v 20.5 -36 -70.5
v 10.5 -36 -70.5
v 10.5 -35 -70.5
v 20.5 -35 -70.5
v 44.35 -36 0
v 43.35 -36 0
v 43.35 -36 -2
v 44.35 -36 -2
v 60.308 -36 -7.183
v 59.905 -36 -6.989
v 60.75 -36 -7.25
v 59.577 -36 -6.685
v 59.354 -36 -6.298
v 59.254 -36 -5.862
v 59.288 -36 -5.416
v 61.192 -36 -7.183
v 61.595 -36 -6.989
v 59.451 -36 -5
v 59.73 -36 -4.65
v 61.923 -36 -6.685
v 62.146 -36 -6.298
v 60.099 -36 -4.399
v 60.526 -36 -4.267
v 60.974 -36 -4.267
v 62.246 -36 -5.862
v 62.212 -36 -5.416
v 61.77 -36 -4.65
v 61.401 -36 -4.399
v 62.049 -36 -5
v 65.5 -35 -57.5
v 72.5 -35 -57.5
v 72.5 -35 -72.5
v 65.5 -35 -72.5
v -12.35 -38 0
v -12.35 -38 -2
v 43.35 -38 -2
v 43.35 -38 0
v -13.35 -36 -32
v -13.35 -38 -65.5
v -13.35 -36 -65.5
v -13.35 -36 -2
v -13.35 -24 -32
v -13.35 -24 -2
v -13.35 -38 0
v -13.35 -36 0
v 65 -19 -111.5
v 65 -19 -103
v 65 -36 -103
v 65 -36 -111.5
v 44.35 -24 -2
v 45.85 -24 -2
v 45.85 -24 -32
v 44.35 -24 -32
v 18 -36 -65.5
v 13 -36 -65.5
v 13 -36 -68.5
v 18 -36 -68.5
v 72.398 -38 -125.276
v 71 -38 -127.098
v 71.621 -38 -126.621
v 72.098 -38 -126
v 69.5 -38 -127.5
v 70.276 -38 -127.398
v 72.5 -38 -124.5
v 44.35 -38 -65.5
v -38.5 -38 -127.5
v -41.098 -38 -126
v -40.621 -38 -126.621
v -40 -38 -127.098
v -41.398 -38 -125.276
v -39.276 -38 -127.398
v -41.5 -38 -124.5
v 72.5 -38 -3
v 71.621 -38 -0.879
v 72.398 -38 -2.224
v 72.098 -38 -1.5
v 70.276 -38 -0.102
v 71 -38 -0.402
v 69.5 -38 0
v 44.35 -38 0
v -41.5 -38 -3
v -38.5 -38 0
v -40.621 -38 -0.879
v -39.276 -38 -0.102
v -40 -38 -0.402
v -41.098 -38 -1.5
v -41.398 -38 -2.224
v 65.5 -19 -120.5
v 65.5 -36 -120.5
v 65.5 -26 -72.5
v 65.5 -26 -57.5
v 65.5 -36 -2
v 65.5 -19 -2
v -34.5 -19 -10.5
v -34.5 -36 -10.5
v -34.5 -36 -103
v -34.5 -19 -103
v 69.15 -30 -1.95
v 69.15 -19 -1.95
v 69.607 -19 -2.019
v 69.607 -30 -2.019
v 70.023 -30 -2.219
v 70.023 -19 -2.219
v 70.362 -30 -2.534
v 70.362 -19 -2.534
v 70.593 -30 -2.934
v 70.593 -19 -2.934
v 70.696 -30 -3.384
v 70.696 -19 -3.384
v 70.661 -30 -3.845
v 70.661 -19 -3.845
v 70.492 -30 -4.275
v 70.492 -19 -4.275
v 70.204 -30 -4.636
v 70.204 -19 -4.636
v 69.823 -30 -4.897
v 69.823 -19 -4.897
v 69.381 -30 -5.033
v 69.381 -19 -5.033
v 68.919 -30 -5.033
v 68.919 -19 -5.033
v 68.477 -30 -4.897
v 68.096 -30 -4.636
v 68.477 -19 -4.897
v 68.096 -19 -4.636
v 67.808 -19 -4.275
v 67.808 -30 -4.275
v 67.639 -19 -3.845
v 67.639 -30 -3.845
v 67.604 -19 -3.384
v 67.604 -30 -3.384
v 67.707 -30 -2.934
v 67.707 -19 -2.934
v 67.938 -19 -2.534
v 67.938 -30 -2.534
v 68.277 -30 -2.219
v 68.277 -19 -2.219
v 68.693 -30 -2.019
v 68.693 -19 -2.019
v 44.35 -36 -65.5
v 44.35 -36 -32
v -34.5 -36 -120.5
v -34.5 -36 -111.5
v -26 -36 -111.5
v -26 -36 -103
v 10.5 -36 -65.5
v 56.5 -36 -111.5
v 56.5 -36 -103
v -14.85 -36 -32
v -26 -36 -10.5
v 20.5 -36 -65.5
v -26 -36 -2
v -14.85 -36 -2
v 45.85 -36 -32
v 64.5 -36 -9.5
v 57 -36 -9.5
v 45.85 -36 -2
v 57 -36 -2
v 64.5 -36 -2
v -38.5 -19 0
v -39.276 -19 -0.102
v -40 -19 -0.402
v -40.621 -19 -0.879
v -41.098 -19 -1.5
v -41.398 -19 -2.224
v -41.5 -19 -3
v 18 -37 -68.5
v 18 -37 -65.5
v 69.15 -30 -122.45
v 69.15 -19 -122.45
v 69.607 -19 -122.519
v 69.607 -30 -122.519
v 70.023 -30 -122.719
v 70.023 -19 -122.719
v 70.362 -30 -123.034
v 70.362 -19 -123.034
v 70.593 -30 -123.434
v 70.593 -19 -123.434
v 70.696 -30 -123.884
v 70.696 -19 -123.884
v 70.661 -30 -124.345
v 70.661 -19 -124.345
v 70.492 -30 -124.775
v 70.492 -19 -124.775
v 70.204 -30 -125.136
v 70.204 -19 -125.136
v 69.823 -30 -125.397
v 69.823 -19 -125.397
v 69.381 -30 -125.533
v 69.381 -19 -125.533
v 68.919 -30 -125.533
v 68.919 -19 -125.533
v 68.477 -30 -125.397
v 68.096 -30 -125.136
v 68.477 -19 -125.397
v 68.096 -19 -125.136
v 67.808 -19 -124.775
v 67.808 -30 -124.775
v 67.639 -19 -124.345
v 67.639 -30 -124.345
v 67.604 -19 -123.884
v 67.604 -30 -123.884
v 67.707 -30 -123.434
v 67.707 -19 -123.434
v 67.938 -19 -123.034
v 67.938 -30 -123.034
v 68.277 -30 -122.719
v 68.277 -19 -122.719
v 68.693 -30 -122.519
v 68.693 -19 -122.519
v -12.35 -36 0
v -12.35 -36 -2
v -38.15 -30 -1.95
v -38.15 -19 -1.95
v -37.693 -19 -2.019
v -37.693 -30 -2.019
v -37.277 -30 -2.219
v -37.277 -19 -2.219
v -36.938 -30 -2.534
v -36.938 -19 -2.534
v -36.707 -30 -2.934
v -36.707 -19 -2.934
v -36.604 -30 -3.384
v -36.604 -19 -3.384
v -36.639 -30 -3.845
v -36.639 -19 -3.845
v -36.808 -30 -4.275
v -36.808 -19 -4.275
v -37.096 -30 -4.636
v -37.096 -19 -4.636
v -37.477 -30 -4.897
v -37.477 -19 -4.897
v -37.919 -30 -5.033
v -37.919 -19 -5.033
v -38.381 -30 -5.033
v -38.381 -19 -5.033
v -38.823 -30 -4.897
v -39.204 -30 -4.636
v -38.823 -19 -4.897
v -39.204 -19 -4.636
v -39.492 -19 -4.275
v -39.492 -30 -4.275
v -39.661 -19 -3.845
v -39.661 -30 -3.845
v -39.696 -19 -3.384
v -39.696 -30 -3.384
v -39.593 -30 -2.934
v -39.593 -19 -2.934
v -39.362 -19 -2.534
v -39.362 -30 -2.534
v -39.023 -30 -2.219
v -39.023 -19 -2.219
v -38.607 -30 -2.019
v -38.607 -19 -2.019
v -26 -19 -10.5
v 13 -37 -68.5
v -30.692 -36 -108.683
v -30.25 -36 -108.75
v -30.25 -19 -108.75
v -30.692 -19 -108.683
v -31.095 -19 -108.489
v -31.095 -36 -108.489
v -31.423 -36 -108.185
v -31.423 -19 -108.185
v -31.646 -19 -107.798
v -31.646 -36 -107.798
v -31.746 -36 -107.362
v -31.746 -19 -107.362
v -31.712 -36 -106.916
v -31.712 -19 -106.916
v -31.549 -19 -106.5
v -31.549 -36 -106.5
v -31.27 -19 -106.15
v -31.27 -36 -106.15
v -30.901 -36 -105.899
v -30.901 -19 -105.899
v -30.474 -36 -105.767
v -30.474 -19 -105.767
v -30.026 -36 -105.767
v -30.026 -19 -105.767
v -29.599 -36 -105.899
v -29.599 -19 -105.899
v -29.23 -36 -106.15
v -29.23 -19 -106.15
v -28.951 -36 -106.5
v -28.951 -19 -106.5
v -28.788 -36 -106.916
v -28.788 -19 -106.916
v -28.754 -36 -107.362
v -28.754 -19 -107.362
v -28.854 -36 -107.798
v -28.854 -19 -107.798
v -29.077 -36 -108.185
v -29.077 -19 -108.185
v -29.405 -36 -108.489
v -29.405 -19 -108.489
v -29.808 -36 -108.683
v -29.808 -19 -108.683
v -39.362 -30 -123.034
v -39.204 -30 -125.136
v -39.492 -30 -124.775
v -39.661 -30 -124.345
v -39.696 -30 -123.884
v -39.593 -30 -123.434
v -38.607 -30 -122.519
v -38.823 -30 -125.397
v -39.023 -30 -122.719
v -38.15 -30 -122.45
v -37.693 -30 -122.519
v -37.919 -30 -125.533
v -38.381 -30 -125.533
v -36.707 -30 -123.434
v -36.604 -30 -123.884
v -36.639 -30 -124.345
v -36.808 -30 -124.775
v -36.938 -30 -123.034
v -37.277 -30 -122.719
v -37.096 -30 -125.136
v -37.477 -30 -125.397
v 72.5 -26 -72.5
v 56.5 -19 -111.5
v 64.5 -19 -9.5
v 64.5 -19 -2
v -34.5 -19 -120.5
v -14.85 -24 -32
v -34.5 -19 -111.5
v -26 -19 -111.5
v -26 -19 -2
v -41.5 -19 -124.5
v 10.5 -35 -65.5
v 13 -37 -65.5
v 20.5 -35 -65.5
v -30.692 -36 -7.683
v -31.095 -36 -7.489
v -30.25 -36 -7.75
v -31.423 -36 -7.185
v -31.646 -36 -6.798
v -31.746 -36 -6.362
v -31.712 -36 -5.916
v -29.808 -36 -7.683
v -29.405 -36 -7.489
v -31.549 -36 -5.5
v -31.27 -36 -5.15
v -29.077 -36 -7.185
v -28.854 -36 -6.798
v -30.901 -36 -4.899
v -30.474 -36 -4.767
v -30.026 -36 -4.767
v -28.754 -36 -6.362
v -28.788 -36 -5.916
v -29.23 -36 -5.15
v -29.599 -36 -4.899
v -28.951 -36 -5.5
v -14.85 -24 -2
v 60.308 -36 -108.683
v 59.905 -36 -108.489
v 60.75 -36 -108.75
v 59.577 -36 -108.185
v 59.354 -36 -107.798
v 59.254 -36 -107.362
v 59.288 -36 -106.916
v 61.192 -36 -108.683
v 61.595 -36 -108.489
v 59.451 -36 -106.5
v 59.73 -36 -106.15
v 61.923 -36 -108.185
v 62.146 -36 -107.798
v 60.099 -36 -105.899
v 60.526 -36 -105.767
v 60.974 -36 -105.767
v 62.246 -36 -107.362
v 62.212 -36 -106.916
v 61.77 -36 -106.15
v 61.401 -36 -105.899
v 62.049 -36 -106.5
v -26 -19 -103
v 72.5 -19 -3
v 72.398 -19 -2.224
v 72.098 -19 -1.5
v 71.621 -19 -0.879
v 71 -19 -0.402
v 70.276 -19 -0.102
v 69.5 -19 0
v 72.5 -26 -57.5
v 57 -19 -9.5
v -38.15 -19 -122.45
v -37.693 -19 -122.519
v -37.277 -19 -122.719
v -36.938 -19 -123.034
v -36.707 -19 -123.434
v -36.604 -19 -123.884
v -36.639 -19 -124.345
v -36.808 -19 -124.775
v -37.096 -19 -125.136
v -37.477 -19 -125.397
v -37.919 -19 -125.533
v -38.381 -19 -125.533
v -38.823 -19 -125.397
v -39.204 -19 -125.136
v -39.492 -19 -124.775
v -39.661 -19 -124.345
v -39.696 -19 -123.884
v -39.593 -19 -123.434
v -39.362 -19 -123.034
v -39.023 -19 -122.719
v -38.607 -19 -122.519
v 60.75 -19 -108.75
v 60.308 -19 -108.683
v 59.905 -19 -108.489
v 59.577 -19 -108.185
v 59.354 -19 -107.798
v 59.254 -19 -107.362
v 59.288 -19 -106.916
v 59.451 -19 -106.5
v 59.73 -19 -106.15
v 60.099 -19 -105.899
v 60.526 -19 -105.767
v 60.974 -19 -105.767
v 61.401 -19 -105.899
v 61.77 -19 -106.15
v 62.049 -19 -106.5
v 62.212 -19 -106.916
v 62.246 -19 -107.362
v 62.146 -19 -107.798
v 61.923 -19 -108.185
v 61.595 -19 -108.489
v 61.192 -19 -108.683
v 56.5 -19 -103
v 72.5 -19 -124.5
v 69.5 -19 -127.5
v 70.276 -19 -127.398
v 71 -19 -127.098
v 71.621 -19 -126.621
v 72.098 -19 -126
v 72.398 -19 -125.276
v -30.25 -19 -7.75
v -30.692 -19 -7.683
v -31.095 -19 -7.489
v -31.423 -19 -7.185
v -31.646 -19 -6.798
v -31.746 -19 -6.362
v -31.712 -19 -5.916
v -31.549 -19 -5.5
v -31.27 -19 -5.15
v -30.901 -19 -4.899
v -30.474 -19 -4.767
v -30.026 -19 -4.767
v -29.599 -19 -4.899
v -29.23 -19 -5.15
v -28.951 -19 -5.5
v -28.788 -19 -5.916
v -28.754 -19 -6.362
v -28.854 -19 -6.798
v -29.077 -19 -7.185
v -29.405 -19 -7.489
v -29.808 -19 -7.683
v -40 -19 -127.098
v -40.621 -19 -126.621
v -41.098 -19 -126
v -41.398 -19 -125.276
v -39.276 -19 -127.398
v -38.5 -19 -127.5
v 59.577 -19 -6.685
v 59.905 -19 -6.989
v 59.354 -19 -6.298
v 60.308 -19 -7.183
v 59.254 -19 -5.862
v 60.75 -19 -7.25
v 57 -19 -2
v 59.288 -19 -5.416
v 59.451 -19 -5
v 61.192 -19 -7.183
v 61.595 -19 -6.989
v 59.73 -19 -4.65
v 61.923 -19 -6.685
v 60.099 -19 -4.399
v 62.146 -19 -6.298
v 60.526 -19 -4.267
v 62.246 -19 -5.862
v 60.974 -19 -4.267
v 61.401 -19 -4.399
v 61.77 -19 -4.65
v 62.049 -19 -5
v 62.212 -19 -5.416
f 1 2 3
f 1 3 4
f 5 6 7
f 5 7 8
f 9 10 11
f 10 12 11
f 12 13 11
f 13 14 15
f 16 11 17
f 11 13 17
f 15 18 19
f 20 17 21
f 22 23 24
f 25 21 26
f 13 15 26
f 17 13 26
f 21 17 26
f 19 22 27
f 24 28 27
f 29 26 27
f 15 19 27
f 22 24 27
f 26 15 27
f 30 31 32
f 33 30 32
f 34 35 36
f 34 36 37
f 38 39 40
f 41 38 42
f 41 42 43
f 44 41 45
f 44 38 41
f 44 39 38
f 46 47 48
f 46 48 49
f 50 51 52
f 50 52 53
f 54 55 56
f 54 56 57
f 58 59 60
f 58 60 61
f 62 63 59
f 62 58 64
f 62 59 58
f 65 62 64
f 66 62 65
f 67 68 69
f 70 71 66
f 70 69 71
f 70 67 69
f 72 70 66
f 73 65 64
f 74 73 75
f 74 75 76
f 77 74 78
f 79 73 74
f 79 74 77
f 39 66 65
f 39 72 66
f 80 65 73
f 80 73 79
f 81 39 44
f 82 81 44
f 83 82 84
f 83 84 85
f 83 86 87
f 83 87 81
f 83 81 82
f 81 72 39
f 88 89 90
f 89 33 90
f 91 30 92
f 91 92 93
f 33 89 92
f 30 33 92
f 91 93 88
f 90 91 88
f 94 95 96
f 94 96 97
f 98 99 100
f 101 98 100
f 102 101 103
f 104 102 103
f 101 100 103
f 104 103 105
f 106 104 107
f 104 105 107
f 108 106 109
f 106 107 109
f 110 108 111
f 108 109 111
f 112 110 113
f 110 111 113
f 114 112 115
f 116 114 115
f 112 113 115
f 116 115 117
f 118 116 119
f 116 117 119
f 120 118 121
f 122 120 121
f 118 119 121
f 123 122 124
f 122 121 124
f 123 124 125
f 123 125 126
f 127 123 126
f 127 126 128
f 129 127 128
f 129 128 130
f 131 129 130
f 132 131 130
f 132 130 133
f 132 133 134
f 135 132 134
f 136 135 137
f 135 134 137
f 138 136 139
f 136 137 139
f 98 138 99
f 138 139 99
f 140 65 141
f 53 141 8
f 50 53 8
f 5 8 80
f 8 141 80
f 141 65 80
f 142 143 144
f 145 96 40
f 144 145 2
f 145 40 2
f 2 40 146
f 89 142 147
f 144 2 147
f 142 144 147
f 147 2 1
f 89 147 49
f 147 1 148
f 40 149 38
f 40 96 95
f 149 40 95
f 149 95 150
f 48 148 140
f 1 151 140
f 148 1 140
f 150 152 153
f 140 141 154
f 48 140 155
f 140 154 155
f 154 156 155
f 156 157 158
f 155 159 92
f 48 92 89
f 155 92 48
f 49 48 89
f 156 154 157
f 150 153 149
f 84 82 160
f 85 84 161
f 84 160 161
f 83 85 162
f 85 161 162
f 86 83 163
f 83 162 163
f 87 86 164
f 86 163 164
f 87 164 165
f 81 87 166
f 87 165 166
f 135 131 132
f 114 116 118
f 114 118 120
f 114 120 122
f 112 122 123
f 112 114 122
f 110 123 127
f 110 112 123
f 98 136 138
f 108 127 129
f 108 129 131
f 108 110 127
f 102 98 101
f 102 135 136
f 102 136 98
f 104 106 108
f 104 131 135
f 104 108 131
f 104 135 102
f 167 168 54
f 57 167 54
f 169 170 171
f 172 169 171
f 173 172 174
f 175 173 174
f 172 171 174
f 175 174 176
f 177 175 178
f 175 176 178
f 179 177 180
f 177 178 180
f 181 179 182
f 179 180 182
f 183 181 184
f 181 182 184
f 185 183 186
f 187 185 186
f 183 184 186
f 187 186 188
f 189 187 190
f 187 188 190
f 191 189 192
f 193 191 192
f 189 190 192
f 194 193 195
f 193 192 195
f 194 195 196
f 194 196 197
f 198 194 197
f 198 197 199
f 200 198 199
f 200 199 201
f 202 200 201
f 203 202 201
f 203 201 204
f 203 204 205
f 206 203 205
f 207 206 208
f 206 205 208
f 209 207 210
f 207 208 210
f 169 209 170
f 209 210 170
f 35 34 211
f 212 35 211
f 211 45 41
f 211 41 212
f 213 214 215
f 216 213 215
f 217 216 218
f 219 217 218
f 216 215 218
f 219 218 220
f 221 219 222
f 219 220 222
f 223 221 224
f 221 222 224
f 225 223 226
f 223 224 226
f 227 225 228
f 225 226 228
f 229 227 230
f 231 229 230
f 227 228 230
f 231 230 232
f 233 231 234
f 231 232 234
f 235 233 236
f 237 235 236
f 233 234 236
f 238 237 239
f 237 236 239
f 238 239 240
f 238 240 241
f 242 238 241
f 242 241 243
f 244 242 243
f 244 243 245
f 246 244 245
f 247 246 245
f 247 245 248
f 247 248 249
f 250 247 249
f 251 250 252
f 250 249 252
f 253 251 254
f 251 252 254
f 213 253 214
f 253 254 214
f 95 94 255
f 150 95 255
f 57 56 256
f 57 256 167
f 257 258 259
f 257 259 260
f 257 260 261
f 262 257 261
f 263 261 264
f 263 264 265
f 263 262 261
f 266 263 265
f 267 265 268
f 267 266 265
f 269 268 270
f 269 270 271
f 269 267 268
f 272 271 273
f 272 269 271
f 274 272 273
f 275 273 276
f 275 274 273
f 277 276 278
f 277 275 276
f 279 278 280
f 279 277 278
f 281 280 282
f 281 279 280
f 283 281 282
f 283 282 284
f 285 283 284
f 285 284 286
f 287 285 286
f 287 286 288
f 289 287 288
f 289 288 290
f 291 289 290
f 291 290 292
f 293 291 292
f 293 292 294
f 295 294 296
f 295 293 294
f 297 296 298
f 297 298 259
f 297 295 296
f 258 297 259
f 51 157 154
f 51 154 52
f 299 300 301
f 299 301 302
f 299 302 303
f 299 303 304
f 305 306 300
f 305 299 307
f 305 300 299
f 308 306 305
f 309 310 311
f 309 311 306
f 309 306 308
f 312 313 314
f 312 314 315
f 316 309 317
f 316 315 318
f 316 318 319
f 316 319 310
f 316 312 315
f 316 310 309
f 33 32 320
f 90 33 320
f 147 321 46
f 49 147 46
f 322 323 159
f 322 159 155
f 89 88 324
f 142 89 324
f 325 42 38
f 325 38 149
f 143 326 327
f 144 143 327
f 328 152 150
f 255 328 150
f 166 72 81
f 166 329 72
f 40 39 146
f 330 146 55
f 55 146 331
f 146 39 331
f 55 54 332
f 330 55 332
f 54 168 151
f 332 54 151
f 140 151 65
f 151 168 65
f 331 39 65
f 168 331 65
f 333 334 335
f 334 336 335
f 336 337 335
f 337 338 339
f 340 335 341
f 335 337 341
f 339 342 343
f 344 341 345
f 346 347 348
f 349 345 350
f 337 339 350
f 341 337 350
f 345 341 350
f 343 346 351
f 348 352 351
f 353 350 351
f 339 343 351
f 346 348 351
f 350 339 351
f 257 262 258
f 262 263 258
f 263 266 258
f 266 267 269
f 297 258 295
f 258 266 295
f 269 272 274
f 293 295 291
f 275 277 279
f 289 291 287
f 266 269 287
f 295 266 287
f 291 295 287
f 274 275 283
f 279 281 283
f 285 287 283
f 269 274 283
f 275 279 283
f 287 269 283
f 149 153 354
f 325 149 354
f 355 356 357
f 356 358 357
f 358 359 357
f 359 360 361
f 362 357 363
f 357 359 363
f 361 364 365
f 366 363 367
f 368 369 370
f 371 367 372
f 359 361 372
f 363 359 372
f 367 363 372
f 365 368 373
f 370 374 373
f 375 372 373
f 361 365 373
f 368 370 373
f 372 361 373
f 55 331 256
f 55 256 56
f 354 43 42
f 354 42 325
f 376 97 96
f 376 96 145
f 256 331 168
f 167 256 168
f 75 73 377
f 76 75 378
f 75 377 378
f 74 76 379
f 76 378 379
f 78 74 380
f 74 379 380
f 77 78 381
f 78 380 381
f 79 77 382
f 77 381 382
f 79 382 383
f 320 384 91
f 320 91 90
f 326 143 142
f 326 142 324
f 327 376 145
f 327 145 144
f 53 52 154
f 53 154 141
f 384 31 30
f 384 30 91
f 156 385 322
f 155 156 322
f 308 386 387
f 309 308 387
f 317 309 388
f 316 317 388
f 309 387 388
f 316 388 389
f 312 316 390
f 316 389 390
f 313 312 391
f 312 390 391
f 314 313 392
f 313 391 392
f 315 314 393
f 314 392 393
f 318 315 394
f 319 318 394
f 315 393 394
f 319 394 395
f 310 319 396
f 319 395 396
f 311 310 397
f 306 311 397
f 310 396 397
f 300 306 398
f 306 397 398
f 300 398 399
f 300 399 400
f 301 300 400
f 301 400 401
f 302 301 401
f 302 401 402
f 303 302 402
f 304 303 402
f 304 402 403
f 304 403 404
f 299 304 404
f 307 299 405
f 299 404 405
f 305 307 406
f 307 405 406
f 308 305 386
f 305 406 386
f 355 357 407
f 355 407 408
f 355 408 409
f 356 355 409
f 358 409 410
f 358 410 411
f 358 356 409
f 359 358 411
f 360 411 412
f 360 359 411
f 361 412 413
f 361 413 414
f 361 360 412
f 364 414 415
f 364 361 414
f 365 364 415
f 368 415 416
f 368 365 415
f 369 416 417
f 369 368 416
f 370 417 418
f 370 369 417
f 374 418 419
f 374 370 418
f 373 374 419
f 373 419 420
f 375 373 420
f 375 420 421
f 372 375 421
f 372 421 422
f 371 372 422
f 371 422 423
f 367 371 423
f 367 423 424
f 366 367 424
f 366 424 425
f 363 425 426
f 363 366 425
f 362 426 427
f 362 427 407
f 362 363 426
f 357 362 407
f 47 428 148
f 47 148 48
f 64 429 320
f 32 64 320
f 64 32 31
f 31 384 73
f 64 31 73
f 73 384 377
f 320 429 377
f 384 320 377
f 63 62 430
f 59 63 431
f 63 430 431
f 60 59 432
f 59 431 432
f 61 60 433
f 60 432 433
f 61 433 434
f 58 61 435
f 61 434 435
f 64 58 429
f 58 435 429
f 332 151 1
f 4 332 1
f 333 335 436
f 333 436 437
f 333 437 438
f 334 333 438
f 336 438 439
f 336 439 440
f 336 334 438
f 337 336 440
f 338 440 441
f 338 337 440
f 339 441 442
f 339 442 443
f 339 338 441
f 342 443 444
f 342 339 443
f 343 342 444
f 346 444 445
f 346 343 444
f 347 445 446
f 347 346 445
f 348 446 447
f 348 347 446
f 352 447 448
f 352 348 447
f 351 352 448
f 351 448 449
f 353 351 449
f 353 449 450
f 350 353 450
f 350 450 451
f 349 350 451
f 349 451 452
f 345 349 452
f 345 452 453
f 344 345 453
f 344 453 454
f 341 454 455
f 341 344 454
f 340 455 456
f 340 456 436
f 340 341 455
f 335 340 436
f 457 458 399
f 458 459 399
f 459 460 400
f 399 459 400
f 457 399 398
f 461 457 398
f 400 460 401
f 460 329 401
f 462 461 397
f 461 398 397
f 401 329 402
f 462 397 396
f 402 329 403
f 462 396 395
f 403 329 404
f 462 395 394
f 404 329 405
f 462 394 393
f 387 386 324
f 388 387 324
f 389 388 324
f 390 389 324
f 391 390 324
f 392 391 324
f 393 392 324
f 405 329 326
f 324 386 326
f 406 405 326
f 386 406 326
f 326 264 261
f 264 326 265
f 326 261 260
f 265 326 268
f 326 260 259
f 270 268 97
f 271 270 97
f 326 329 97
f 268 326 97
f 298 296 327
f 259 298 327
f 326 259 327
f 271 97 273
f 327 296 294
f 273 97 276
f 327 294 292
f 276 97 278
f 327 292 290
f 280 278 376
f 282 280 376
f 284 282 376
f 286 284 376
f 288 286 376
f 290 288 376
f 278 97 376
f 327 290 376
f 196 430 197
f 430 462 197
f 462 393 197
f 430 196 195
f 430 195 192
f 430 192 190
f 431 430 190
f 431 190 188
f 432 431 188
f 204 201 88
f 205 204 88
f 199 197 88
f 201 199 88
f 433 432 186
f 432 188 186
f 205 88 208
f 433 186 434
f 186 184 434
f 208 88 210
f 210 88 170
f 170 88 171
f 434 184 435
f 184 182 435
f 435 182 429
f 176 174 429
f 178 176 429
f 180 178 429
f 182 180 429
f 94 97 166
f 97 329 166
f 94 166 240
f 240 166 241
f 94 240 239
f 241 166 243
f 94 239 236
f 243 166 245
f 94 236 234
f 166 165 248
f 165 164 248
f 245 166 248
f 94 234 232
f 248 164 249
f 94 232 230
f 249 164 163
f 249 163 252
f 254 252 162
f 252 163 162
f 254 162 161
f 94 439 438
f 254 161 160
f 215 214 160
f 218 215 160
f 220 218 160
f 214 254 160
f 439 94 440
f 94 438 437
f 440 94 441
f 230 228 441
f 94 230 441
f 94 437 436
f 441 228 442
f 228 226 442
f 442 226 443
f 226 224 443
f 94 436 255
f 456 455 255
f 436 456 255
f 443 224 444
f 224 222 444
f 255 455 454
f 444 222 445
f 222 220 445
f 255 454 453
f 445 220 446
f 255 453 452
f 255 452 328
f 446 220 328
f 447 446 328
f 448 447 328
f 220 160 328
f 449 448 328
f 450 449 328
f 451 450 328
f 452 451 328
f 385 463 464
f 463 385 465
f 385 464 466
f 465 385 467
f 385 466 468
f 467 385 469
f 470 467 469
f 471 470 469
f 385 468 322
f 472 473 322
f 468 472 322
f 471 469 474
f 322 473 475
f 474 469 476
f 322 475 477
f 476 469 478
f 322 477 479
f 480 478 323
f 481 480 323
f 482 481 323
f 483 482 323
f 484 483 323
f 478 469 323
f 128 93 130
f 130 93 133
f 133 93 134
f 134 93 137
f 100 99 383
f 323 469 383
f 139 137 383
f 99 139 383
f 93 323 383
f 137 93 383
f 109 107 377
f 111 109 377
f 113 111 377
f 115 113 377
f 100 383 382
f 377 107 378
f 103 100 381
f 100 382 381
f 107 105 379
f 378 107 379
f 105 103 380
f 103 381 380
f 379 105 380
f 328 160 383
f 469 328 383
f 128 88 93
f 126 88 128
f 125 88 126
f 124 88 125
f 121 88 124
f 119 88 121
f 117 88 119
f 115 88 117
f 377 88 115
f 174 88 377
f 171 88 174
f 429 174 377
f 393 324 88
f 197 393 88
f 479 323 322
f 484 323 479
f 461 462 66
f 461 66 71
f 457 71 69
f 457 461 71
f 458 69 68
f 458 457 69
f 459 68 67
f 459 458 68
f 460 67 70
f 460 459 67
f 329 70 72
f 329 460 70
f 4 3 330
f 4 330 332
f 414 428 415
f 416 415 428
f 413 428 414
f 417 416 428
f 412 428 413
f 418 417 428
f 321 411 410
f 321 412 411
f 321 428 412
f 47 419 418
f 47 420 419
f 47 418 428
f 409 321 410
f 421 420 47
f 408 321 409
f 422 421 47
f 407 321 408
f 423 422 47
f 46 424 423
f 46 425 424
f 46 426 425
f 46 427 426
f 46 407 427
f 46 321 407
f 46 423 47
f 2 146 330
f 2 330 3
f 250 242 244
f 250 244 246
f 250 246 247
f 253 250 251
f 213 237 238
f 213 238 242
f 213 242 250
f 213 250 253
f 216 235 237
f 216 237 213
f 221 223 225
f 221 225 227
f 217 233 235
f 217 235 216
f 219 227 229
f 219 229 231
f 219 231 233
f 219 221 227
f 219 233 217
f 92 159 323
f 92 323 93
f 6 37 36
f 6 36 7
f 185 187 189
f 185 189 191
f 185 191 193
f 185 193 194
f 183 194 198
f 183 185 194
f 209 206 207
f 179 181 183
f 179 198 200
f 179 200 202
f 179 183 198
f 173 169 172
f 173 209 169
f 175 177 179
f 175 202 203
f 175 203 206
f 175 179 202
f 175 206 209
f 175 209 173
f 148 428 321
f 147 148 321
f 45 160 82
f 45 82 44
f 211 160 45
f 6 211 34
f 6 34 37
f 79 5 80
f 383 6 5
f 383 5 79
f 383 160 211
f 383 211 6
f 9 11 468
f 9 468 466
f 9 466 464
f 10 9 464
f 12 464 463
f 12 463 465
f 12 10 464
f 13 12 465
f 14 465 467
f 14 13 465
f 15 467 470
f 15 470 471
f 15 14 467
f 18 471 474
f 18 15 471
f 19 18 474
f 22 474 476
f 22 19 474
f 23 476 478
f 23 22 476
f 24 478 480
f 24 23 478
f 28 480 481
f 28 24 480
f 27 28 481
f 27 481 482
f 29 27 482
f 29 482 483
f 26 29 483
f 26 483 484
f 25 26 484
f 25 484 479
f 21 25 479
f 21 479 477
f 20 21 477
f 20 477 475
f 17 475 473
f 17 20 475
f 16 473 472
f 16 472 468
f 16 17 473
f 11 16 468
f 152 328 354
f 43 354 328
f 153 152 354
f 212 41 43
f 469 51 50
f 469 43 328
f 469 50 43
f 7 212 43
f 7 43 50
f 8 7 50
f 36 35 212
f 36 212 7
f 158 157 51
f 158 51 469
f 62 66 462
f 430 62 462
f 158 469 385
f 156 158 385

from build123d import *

# Parameters (mm, degrees)
SALIENTE_EXTRUIR4_DEPTH  = 2
SALIENTE_EXTRUIR6_DEPTH  = 120.5
CROQUIS8_W               = 104
CROQUIS8_H               = 122.5
SALIENTE_EXTRUIR7_DEPTH  = 2
CROQUIS9_W               = 100
CROQUIS9_H               = 17
SALIENTE_EXTRUIR8_DEPTH  = 2
CROQUIS13_W              = 8.5
CROQUIS13_H              = 8.5
CROQUIS13_R              = 1.5
CROQUIS13_W_2            = 7.5
CROQUIS13_H_2            = 7.5
SALIENTE_EXTRUIR9_DEPTH  = 17
CROQUIS14_W              = 5
CROQUIS14_H              = 28
SALIENTE_EXTRUIR10_DEPTH = 122.5
CROQUIS15_W              = 5
CROQUIS15_H              = 28
SALIENTE_EXTRUIR11_DEPTH = 114
REDONDEO1_R              = 3
CORTAR_EXTRUIR1_REACH    = 153.514
CROQUIS17_W              = 5
CROQUIS17_H              = 9
CORTAR_EXTRUIR2_REACH    = 173.992
CROQUIS18_W              = 5
CROQUIS18_H              = 9
CROQUIS19_R              = 1.55
CORTAR_EXTRUIR3_DEPTH    = 11
CROQUIS20_W              = 57.7
CROQUIS20_H              = 63.5
CORTAR_EXTRUIR4_DEPTH    = 152.514025753
CROQUIS22_W              = 1.5
CROQUIS22_H              = 12
SALIENTE_EXTRUIR12_DEPTH = 30
CROQUIS26_W              = 10
CROQUIS26_H              = 5
SALIENTE_EXTRUIR14_DEPTH = 1
CROQUIS27_W              = 5
CROQUIS27_H              = 1
CORTAR_EXTRUIR8_DEPTH    = 3
CROQUIS28_W              = 1
CROQUIS28_H              = 2
CORTAR_EXTRUIR9_DEPTH    = 10
CROQUIS29_W              = 102
CROQUIS29_H              = 7.5
CORTAR_EXTRUIR11_DEPTH   = 125.5
CROQUIS30_W              = 102
CROQUIS30_H              = 19
CORTAR_EXTRUIR12_DEPTH   = 152.514025753
CROQUIS31_W              = 15
CROQUIS31_H              = 9
CORTAR_EXTRUIR13_DEPTH   = 10


with BuildPart() as part:
    # Croquis5 → Saliente-Extruir4 (new body)
    with BuildSketch(Plane.XY):
        Polygon((0, 0), (39, 0), (39, -10), (66.5, -10), (66.5, -19), (67.5, -19), (67.5, -36), (-36.5, -36), (-36.5, -19), (-35.5, -19), (-35.5, -10), (0, -10), align=None)
    extrude(amount=-SALIENTE_EXTRUIR4_DEPTH)

    # Croquis7 → Saliente-Extruir6 (add)
    with BuildSketch(Plane(origin=(0, 0, -2), x_dir=(-1, 0, 0), z_dir=(0, 0, -1))):
        Polygon((-67.5, -36), (-65.5, -36), (-65.5, -11.5), (-66.5, -11.5), (-66.5, -19), (-67.5, -19), align=None)
        Polygon((36.5, -36), (34.5, -36), (34.5, -11.5), (35.5, -11.5), (35.5, -19), (36.5, -19), align=None)
    extrude(amount=SALIENTE_EXTRUIR6_DEPTH)

    # Croquis8 → Saliente-Extruir7 (add)
    with BuildSketch(Plane.XZ.offset(36)):
        with Locations((15.5, -61.25)):
            Rectangle(CROQUIS8_W, CROQUIS8_H)
    extrude(amount=SALIENTE_EXTRUIR7_DEPTH)

    # Croquis9 → Saliente-Extruir8 (add)
    with BuildSketch(Plane(origin=(0, 0, -122.5), x_dir=(-1, 0, 0), z_dir=(0, 0, -1))):
        with Locations((-15.5, -27.5)):
            Rectangle(CROQUIS9_W, CROQUIS9_H)
    extrude(amount=-SALIENTE_EXTRUIR8_DEPTH)

    # Croquis13 → Saliente-Extruir9 (add)
    # profile 1 of 4: a face of its own
    with BuildSketch(Plane(origin=(0, -36, 0), x_dir=(1, 0, 0), z_dir=(0, 1, 0))):
        with Locations((-30.25, 6.25)):
            Rectangle(CROQUIS13_W, CROQUIS13_H)
        with Locations(Location((-30.25, 6.25, 0), (0, 0, 90))):
            Circle(CROQUIS13_R, mode=Mode.SUBTRACT)
    # profile 2 of 4: a face of its own
    with BuildSketch(Plane(origin=(0, -36, 0), x_dir=(1, 0, 0), z_dir=(0, 1, 0))):
        with Locations((-30.25, 107.25)):
            Rectangle(CROQUIS13_W, CROQUIS13_H)
        with Locations(Location((-30.25, 107.25, 0), (0, 0, 90))):
            Circle(CROQUIS13_R, mode=Mode.SUBTRACT)
    # profile 3 of 4: a face of its own
    with BuildSketch(Plane(origin=(0, -36, 0), x_dir=(1, 0, 0), z_dir=(0, 1, 0))):
        with Locations((60.75, 107.25)):
            Rectangle(CROQUIS13_W, CROQUIS13_H)
        with Locations(Location((60.75, 107.25, 0), (0, 0, 90))):
            Circle(CROQUIS13_R, mode=Mode.SUBTRACT)
    # profile 4 of 4: a face of its own
    with BuildSketch(Plane(origin=(0, -36, 0), x_dir=(1, 0, 0), z_dir=(0, 1, 0))):
        with Locations((60.75, 5.75)):
            Rectangle(CROQUIS13_W_2, CROQUIS13_H_2)
        with Locations(Location((60.75, 5.75, 0), (0, 0, 90))):
            Circle(CROQUIS13_R, mode=Mode.SUBTRACT)
    extrude(amount=SALIENTE_EXTRUIR9_DEPTH)

    # Croquis14 → Saliente-Extruir10 (add)
    with BuildSketch(Plane.XY):
        with Locations((-39, -24)):
            Rectangle(CROQUIS14_W, CROQUIS14_H)
        with Locations((70, -24)):
            Rectangle(CROQUIS14_W, CROQUIS14_H)
    extrude(amount=-SALIENTE_EXTRUIR10_DEPTH)

    # Croquis15 → Saliente-Extruir11 (add)
    with BuildSketch(Plane.ZY.offset(41.5)):
        with Locations((-125, -24)):
            Rectangle(CROQUIS15_W, CROQUIS15_H)
    extrude(amount=-SALIENTE_EXTRUIR11_DEPTH)

    # Redondeo1
    redondeo1_edges = [part.edges().sort_by_distance(p)[0] for p in [
        (-41.5, -24, 0),
        (72.5, -24, 0),
        (-41.5, -24, -127.5),
        (72.5, -24, -127.5),
    ]]
    fillet(redondeo1_edges, radius=REDONDEO1_R)

    # Croquis17 → Cortar-Extruir1 (cut, up to next)
    with BuildSketch(Plane.XY, mode=Mode.PRIVATE) as cortar_extruir1_sk1:
        with Locations((-39, -14.5)):
            Rectangle(CROQUIS17_W, CROQUIS17_H)
    cortar_extruir1_tool1 = extrude(cortar_extruir1_sk1.sketch, amount=-CORTAR_EXTRUIR1_REACH, mode=Mode.PRIVATE) & part.part
    # Croquis17 → Cortar-Extruir1 (cut, up to next)
    with BuildSketch(Plane.XY, mode=Mode.PRIVATE) as cortar_extruir1_sk2:
        with Locations((70, -14.5)):
            Rectangle(CROQUIS17_W, CROQUIS17_H)
    cortar_extruir1_tool2 = extrude(cortar_extruir1_sk2.sketch, amount=-CORTAR_EXTRUIR1_REACH, mode=Mode.PRIVATE) & part.part
    add(cortar_extruir1_tool1.solids().sort_by_distance((-39, -14.5, 0))[0], mode=Mode.SUBTRACT)
    add(cortar_extruir1_tool2.solids().sort_by_distance((70, -14.5, 0))[0], mode=Mode.SUBTRACT)

    # Croquis18 → Cortar-Extruir2 (cut, up to next)
    with BuildSketch(Plane(origin=(67.5, 0, 0), x_dir=(0, 0, -1), z_dir=(1, 0, 0)), mode=Mode.PRIVATE) as cortar_extruir2_sk1:
        with Locations((125, -14.5)):
            Rectangle(CROQUIS18_W, CROQUIS18_H)
    cortar_extruir2_tool1 = extrude(cortar_extruir2_sk1.sketch, amount=-CORTAR_EXTRUIR2_REACH, mode=Mode.PRIVATE) & part.part
    add(cortar_extruir2_tool1.solids().sort_by_distance((67.5, -14.5, -125))[0], mode=Mode.SUBTRACT)

    # Croquis19 → Cortar-Extruir3 (cut)
    with BuildSketch(Plane(origin=(0, -19, 0), x_dir=(1, 0, 0), z_dir=(0, 1, 0))):
        with Locations(Location((-38.15, 124, 0), (0, 0, 270))):
            Circle(CROQUIS19_R)
        with Locations(Location((69.15, 124, 0), (0, 0, 270))):
            Circle(CROQUIS19_R)
        with Locations(Location((-38.15, 3.5, 0), (0, 0, 270))):
            Circle(CROQUIS19_R)
        with Locations(Location((69.15, 3.5, 0), (0, 0, 270))):
            Circle(CROQUIS19_R)
    extrude(amount=-CORTAR_EXTRUIR3_DEPTH, mode=Mode.SUBTRACT)

    # Croquis20 → Cortar-Extruir4 (cut, through all)
    with BuildSketch(Plane.XZ.offset(38)):
        with Locations((15.5, -33.75)):
            Rectangle(CROQUIS20_W, CROQUIS20_H)
    extrude(amount=-CORTAR_EXTRUIR4_DEPTH, mode=Mode.SUBTRACT)

    # Croquis22 → Saliente-Extruir12 (add)
    with BuildSketch(Plane(origin=(0, 0, -2), x_dir=(-1, 0, 0), z_dir=(0, 0, -1))):
        with Locations((-45.1, -30)):
            Rectangle(CROQUIS22_W, CROQUIS22_H)
        with Locations((14.1, -30)):
            Rectangle(CROQUIS22_W, CROQUIS22_H)
    extrude(amount=SALIENTE_EXTRUIR12_DEPTH)

    # Croquis26 → Saliente-Extruir14 (add)
    with BuildSketch(Plane(origin=(0, -36, 0), x_dir=(1, 0, 0), z_dir=(0, 1, 0))):
        with Locations((15.5, 68)):
            Rectangle(CROQUIS26_W, CROQUIS26_H)
    extrude(amount=SALIENTE_EXTRUIR14_DEPTH)

    # Croquis27 → Cortar-Extruir8 (cut)
    with BuildSketch(Plane.XY.offset(-65.5)):
        with Locations((15.5, -36.5)):
            Rectangle(CROQUIS27_W, CROQUIS27_H)
    extrude(amount=-CORTAR_EXTRUIR8_DEPTH, mode=Mode.SUBTRACT)

    # Croquis28 → Cortar-Extruir9 (cut)
    with BuildSketch(Plane.XY):
        with Locations((43.85, -37)):
            Rectangle(CROQUIS28_W, CROQUIS28_H)
        with Locations((-12.85, -37)):
            Rectangle(CROQUIS28_W, CROQUIS28_H)
    extrude(amount=-CORTAR_EXTRUIR9_DEPTH, mode=Mode.SUBTRACT)

    # Croquis29 → Cortar-Extruir11 (cut)
    with BuildSketch(Plane(origin=(0, 0, -127.5), x_dir=(-1, 0, 0), z_dir=(0, 0, -1))):
        with Locations((-15.5, -15.25)):
            Rectangle(CROQUIS29_W, CROQUIS29_H)
    extrude(amount=-CORTAR_EXTRUIR11_DEPTH, mode=Mode.SUBTRACT)

    # Croquis30 → Cortar-Extruir12 (cut, through all)
    with BuildSketch(Plane.XY):
        with Locations((15.5, -9.5)):
            Rectangle(CROQUIS30_W, CROQUIS30_H)
    extrude(amount=-CORTAR_EXTRUIR12_DEPTH, mode=Mode.SUBTRACT)

    # Croquis31 → Cortar-Extruir13 (cut)
    with BuildSketch(Plane(origin=(72.5, 0, 0), x_dir=(0, 0, -1), z_dir=(1, 0, 0))):
        with Locations((65, -30.5)):
            Rectangle(CROQUIS31_W, CROQUIS31_H)
    extrude(amount=-CORTAR_EXTRUIR13_DEPTH, mode=Mode.SUBTRACT)


solid = part.part
